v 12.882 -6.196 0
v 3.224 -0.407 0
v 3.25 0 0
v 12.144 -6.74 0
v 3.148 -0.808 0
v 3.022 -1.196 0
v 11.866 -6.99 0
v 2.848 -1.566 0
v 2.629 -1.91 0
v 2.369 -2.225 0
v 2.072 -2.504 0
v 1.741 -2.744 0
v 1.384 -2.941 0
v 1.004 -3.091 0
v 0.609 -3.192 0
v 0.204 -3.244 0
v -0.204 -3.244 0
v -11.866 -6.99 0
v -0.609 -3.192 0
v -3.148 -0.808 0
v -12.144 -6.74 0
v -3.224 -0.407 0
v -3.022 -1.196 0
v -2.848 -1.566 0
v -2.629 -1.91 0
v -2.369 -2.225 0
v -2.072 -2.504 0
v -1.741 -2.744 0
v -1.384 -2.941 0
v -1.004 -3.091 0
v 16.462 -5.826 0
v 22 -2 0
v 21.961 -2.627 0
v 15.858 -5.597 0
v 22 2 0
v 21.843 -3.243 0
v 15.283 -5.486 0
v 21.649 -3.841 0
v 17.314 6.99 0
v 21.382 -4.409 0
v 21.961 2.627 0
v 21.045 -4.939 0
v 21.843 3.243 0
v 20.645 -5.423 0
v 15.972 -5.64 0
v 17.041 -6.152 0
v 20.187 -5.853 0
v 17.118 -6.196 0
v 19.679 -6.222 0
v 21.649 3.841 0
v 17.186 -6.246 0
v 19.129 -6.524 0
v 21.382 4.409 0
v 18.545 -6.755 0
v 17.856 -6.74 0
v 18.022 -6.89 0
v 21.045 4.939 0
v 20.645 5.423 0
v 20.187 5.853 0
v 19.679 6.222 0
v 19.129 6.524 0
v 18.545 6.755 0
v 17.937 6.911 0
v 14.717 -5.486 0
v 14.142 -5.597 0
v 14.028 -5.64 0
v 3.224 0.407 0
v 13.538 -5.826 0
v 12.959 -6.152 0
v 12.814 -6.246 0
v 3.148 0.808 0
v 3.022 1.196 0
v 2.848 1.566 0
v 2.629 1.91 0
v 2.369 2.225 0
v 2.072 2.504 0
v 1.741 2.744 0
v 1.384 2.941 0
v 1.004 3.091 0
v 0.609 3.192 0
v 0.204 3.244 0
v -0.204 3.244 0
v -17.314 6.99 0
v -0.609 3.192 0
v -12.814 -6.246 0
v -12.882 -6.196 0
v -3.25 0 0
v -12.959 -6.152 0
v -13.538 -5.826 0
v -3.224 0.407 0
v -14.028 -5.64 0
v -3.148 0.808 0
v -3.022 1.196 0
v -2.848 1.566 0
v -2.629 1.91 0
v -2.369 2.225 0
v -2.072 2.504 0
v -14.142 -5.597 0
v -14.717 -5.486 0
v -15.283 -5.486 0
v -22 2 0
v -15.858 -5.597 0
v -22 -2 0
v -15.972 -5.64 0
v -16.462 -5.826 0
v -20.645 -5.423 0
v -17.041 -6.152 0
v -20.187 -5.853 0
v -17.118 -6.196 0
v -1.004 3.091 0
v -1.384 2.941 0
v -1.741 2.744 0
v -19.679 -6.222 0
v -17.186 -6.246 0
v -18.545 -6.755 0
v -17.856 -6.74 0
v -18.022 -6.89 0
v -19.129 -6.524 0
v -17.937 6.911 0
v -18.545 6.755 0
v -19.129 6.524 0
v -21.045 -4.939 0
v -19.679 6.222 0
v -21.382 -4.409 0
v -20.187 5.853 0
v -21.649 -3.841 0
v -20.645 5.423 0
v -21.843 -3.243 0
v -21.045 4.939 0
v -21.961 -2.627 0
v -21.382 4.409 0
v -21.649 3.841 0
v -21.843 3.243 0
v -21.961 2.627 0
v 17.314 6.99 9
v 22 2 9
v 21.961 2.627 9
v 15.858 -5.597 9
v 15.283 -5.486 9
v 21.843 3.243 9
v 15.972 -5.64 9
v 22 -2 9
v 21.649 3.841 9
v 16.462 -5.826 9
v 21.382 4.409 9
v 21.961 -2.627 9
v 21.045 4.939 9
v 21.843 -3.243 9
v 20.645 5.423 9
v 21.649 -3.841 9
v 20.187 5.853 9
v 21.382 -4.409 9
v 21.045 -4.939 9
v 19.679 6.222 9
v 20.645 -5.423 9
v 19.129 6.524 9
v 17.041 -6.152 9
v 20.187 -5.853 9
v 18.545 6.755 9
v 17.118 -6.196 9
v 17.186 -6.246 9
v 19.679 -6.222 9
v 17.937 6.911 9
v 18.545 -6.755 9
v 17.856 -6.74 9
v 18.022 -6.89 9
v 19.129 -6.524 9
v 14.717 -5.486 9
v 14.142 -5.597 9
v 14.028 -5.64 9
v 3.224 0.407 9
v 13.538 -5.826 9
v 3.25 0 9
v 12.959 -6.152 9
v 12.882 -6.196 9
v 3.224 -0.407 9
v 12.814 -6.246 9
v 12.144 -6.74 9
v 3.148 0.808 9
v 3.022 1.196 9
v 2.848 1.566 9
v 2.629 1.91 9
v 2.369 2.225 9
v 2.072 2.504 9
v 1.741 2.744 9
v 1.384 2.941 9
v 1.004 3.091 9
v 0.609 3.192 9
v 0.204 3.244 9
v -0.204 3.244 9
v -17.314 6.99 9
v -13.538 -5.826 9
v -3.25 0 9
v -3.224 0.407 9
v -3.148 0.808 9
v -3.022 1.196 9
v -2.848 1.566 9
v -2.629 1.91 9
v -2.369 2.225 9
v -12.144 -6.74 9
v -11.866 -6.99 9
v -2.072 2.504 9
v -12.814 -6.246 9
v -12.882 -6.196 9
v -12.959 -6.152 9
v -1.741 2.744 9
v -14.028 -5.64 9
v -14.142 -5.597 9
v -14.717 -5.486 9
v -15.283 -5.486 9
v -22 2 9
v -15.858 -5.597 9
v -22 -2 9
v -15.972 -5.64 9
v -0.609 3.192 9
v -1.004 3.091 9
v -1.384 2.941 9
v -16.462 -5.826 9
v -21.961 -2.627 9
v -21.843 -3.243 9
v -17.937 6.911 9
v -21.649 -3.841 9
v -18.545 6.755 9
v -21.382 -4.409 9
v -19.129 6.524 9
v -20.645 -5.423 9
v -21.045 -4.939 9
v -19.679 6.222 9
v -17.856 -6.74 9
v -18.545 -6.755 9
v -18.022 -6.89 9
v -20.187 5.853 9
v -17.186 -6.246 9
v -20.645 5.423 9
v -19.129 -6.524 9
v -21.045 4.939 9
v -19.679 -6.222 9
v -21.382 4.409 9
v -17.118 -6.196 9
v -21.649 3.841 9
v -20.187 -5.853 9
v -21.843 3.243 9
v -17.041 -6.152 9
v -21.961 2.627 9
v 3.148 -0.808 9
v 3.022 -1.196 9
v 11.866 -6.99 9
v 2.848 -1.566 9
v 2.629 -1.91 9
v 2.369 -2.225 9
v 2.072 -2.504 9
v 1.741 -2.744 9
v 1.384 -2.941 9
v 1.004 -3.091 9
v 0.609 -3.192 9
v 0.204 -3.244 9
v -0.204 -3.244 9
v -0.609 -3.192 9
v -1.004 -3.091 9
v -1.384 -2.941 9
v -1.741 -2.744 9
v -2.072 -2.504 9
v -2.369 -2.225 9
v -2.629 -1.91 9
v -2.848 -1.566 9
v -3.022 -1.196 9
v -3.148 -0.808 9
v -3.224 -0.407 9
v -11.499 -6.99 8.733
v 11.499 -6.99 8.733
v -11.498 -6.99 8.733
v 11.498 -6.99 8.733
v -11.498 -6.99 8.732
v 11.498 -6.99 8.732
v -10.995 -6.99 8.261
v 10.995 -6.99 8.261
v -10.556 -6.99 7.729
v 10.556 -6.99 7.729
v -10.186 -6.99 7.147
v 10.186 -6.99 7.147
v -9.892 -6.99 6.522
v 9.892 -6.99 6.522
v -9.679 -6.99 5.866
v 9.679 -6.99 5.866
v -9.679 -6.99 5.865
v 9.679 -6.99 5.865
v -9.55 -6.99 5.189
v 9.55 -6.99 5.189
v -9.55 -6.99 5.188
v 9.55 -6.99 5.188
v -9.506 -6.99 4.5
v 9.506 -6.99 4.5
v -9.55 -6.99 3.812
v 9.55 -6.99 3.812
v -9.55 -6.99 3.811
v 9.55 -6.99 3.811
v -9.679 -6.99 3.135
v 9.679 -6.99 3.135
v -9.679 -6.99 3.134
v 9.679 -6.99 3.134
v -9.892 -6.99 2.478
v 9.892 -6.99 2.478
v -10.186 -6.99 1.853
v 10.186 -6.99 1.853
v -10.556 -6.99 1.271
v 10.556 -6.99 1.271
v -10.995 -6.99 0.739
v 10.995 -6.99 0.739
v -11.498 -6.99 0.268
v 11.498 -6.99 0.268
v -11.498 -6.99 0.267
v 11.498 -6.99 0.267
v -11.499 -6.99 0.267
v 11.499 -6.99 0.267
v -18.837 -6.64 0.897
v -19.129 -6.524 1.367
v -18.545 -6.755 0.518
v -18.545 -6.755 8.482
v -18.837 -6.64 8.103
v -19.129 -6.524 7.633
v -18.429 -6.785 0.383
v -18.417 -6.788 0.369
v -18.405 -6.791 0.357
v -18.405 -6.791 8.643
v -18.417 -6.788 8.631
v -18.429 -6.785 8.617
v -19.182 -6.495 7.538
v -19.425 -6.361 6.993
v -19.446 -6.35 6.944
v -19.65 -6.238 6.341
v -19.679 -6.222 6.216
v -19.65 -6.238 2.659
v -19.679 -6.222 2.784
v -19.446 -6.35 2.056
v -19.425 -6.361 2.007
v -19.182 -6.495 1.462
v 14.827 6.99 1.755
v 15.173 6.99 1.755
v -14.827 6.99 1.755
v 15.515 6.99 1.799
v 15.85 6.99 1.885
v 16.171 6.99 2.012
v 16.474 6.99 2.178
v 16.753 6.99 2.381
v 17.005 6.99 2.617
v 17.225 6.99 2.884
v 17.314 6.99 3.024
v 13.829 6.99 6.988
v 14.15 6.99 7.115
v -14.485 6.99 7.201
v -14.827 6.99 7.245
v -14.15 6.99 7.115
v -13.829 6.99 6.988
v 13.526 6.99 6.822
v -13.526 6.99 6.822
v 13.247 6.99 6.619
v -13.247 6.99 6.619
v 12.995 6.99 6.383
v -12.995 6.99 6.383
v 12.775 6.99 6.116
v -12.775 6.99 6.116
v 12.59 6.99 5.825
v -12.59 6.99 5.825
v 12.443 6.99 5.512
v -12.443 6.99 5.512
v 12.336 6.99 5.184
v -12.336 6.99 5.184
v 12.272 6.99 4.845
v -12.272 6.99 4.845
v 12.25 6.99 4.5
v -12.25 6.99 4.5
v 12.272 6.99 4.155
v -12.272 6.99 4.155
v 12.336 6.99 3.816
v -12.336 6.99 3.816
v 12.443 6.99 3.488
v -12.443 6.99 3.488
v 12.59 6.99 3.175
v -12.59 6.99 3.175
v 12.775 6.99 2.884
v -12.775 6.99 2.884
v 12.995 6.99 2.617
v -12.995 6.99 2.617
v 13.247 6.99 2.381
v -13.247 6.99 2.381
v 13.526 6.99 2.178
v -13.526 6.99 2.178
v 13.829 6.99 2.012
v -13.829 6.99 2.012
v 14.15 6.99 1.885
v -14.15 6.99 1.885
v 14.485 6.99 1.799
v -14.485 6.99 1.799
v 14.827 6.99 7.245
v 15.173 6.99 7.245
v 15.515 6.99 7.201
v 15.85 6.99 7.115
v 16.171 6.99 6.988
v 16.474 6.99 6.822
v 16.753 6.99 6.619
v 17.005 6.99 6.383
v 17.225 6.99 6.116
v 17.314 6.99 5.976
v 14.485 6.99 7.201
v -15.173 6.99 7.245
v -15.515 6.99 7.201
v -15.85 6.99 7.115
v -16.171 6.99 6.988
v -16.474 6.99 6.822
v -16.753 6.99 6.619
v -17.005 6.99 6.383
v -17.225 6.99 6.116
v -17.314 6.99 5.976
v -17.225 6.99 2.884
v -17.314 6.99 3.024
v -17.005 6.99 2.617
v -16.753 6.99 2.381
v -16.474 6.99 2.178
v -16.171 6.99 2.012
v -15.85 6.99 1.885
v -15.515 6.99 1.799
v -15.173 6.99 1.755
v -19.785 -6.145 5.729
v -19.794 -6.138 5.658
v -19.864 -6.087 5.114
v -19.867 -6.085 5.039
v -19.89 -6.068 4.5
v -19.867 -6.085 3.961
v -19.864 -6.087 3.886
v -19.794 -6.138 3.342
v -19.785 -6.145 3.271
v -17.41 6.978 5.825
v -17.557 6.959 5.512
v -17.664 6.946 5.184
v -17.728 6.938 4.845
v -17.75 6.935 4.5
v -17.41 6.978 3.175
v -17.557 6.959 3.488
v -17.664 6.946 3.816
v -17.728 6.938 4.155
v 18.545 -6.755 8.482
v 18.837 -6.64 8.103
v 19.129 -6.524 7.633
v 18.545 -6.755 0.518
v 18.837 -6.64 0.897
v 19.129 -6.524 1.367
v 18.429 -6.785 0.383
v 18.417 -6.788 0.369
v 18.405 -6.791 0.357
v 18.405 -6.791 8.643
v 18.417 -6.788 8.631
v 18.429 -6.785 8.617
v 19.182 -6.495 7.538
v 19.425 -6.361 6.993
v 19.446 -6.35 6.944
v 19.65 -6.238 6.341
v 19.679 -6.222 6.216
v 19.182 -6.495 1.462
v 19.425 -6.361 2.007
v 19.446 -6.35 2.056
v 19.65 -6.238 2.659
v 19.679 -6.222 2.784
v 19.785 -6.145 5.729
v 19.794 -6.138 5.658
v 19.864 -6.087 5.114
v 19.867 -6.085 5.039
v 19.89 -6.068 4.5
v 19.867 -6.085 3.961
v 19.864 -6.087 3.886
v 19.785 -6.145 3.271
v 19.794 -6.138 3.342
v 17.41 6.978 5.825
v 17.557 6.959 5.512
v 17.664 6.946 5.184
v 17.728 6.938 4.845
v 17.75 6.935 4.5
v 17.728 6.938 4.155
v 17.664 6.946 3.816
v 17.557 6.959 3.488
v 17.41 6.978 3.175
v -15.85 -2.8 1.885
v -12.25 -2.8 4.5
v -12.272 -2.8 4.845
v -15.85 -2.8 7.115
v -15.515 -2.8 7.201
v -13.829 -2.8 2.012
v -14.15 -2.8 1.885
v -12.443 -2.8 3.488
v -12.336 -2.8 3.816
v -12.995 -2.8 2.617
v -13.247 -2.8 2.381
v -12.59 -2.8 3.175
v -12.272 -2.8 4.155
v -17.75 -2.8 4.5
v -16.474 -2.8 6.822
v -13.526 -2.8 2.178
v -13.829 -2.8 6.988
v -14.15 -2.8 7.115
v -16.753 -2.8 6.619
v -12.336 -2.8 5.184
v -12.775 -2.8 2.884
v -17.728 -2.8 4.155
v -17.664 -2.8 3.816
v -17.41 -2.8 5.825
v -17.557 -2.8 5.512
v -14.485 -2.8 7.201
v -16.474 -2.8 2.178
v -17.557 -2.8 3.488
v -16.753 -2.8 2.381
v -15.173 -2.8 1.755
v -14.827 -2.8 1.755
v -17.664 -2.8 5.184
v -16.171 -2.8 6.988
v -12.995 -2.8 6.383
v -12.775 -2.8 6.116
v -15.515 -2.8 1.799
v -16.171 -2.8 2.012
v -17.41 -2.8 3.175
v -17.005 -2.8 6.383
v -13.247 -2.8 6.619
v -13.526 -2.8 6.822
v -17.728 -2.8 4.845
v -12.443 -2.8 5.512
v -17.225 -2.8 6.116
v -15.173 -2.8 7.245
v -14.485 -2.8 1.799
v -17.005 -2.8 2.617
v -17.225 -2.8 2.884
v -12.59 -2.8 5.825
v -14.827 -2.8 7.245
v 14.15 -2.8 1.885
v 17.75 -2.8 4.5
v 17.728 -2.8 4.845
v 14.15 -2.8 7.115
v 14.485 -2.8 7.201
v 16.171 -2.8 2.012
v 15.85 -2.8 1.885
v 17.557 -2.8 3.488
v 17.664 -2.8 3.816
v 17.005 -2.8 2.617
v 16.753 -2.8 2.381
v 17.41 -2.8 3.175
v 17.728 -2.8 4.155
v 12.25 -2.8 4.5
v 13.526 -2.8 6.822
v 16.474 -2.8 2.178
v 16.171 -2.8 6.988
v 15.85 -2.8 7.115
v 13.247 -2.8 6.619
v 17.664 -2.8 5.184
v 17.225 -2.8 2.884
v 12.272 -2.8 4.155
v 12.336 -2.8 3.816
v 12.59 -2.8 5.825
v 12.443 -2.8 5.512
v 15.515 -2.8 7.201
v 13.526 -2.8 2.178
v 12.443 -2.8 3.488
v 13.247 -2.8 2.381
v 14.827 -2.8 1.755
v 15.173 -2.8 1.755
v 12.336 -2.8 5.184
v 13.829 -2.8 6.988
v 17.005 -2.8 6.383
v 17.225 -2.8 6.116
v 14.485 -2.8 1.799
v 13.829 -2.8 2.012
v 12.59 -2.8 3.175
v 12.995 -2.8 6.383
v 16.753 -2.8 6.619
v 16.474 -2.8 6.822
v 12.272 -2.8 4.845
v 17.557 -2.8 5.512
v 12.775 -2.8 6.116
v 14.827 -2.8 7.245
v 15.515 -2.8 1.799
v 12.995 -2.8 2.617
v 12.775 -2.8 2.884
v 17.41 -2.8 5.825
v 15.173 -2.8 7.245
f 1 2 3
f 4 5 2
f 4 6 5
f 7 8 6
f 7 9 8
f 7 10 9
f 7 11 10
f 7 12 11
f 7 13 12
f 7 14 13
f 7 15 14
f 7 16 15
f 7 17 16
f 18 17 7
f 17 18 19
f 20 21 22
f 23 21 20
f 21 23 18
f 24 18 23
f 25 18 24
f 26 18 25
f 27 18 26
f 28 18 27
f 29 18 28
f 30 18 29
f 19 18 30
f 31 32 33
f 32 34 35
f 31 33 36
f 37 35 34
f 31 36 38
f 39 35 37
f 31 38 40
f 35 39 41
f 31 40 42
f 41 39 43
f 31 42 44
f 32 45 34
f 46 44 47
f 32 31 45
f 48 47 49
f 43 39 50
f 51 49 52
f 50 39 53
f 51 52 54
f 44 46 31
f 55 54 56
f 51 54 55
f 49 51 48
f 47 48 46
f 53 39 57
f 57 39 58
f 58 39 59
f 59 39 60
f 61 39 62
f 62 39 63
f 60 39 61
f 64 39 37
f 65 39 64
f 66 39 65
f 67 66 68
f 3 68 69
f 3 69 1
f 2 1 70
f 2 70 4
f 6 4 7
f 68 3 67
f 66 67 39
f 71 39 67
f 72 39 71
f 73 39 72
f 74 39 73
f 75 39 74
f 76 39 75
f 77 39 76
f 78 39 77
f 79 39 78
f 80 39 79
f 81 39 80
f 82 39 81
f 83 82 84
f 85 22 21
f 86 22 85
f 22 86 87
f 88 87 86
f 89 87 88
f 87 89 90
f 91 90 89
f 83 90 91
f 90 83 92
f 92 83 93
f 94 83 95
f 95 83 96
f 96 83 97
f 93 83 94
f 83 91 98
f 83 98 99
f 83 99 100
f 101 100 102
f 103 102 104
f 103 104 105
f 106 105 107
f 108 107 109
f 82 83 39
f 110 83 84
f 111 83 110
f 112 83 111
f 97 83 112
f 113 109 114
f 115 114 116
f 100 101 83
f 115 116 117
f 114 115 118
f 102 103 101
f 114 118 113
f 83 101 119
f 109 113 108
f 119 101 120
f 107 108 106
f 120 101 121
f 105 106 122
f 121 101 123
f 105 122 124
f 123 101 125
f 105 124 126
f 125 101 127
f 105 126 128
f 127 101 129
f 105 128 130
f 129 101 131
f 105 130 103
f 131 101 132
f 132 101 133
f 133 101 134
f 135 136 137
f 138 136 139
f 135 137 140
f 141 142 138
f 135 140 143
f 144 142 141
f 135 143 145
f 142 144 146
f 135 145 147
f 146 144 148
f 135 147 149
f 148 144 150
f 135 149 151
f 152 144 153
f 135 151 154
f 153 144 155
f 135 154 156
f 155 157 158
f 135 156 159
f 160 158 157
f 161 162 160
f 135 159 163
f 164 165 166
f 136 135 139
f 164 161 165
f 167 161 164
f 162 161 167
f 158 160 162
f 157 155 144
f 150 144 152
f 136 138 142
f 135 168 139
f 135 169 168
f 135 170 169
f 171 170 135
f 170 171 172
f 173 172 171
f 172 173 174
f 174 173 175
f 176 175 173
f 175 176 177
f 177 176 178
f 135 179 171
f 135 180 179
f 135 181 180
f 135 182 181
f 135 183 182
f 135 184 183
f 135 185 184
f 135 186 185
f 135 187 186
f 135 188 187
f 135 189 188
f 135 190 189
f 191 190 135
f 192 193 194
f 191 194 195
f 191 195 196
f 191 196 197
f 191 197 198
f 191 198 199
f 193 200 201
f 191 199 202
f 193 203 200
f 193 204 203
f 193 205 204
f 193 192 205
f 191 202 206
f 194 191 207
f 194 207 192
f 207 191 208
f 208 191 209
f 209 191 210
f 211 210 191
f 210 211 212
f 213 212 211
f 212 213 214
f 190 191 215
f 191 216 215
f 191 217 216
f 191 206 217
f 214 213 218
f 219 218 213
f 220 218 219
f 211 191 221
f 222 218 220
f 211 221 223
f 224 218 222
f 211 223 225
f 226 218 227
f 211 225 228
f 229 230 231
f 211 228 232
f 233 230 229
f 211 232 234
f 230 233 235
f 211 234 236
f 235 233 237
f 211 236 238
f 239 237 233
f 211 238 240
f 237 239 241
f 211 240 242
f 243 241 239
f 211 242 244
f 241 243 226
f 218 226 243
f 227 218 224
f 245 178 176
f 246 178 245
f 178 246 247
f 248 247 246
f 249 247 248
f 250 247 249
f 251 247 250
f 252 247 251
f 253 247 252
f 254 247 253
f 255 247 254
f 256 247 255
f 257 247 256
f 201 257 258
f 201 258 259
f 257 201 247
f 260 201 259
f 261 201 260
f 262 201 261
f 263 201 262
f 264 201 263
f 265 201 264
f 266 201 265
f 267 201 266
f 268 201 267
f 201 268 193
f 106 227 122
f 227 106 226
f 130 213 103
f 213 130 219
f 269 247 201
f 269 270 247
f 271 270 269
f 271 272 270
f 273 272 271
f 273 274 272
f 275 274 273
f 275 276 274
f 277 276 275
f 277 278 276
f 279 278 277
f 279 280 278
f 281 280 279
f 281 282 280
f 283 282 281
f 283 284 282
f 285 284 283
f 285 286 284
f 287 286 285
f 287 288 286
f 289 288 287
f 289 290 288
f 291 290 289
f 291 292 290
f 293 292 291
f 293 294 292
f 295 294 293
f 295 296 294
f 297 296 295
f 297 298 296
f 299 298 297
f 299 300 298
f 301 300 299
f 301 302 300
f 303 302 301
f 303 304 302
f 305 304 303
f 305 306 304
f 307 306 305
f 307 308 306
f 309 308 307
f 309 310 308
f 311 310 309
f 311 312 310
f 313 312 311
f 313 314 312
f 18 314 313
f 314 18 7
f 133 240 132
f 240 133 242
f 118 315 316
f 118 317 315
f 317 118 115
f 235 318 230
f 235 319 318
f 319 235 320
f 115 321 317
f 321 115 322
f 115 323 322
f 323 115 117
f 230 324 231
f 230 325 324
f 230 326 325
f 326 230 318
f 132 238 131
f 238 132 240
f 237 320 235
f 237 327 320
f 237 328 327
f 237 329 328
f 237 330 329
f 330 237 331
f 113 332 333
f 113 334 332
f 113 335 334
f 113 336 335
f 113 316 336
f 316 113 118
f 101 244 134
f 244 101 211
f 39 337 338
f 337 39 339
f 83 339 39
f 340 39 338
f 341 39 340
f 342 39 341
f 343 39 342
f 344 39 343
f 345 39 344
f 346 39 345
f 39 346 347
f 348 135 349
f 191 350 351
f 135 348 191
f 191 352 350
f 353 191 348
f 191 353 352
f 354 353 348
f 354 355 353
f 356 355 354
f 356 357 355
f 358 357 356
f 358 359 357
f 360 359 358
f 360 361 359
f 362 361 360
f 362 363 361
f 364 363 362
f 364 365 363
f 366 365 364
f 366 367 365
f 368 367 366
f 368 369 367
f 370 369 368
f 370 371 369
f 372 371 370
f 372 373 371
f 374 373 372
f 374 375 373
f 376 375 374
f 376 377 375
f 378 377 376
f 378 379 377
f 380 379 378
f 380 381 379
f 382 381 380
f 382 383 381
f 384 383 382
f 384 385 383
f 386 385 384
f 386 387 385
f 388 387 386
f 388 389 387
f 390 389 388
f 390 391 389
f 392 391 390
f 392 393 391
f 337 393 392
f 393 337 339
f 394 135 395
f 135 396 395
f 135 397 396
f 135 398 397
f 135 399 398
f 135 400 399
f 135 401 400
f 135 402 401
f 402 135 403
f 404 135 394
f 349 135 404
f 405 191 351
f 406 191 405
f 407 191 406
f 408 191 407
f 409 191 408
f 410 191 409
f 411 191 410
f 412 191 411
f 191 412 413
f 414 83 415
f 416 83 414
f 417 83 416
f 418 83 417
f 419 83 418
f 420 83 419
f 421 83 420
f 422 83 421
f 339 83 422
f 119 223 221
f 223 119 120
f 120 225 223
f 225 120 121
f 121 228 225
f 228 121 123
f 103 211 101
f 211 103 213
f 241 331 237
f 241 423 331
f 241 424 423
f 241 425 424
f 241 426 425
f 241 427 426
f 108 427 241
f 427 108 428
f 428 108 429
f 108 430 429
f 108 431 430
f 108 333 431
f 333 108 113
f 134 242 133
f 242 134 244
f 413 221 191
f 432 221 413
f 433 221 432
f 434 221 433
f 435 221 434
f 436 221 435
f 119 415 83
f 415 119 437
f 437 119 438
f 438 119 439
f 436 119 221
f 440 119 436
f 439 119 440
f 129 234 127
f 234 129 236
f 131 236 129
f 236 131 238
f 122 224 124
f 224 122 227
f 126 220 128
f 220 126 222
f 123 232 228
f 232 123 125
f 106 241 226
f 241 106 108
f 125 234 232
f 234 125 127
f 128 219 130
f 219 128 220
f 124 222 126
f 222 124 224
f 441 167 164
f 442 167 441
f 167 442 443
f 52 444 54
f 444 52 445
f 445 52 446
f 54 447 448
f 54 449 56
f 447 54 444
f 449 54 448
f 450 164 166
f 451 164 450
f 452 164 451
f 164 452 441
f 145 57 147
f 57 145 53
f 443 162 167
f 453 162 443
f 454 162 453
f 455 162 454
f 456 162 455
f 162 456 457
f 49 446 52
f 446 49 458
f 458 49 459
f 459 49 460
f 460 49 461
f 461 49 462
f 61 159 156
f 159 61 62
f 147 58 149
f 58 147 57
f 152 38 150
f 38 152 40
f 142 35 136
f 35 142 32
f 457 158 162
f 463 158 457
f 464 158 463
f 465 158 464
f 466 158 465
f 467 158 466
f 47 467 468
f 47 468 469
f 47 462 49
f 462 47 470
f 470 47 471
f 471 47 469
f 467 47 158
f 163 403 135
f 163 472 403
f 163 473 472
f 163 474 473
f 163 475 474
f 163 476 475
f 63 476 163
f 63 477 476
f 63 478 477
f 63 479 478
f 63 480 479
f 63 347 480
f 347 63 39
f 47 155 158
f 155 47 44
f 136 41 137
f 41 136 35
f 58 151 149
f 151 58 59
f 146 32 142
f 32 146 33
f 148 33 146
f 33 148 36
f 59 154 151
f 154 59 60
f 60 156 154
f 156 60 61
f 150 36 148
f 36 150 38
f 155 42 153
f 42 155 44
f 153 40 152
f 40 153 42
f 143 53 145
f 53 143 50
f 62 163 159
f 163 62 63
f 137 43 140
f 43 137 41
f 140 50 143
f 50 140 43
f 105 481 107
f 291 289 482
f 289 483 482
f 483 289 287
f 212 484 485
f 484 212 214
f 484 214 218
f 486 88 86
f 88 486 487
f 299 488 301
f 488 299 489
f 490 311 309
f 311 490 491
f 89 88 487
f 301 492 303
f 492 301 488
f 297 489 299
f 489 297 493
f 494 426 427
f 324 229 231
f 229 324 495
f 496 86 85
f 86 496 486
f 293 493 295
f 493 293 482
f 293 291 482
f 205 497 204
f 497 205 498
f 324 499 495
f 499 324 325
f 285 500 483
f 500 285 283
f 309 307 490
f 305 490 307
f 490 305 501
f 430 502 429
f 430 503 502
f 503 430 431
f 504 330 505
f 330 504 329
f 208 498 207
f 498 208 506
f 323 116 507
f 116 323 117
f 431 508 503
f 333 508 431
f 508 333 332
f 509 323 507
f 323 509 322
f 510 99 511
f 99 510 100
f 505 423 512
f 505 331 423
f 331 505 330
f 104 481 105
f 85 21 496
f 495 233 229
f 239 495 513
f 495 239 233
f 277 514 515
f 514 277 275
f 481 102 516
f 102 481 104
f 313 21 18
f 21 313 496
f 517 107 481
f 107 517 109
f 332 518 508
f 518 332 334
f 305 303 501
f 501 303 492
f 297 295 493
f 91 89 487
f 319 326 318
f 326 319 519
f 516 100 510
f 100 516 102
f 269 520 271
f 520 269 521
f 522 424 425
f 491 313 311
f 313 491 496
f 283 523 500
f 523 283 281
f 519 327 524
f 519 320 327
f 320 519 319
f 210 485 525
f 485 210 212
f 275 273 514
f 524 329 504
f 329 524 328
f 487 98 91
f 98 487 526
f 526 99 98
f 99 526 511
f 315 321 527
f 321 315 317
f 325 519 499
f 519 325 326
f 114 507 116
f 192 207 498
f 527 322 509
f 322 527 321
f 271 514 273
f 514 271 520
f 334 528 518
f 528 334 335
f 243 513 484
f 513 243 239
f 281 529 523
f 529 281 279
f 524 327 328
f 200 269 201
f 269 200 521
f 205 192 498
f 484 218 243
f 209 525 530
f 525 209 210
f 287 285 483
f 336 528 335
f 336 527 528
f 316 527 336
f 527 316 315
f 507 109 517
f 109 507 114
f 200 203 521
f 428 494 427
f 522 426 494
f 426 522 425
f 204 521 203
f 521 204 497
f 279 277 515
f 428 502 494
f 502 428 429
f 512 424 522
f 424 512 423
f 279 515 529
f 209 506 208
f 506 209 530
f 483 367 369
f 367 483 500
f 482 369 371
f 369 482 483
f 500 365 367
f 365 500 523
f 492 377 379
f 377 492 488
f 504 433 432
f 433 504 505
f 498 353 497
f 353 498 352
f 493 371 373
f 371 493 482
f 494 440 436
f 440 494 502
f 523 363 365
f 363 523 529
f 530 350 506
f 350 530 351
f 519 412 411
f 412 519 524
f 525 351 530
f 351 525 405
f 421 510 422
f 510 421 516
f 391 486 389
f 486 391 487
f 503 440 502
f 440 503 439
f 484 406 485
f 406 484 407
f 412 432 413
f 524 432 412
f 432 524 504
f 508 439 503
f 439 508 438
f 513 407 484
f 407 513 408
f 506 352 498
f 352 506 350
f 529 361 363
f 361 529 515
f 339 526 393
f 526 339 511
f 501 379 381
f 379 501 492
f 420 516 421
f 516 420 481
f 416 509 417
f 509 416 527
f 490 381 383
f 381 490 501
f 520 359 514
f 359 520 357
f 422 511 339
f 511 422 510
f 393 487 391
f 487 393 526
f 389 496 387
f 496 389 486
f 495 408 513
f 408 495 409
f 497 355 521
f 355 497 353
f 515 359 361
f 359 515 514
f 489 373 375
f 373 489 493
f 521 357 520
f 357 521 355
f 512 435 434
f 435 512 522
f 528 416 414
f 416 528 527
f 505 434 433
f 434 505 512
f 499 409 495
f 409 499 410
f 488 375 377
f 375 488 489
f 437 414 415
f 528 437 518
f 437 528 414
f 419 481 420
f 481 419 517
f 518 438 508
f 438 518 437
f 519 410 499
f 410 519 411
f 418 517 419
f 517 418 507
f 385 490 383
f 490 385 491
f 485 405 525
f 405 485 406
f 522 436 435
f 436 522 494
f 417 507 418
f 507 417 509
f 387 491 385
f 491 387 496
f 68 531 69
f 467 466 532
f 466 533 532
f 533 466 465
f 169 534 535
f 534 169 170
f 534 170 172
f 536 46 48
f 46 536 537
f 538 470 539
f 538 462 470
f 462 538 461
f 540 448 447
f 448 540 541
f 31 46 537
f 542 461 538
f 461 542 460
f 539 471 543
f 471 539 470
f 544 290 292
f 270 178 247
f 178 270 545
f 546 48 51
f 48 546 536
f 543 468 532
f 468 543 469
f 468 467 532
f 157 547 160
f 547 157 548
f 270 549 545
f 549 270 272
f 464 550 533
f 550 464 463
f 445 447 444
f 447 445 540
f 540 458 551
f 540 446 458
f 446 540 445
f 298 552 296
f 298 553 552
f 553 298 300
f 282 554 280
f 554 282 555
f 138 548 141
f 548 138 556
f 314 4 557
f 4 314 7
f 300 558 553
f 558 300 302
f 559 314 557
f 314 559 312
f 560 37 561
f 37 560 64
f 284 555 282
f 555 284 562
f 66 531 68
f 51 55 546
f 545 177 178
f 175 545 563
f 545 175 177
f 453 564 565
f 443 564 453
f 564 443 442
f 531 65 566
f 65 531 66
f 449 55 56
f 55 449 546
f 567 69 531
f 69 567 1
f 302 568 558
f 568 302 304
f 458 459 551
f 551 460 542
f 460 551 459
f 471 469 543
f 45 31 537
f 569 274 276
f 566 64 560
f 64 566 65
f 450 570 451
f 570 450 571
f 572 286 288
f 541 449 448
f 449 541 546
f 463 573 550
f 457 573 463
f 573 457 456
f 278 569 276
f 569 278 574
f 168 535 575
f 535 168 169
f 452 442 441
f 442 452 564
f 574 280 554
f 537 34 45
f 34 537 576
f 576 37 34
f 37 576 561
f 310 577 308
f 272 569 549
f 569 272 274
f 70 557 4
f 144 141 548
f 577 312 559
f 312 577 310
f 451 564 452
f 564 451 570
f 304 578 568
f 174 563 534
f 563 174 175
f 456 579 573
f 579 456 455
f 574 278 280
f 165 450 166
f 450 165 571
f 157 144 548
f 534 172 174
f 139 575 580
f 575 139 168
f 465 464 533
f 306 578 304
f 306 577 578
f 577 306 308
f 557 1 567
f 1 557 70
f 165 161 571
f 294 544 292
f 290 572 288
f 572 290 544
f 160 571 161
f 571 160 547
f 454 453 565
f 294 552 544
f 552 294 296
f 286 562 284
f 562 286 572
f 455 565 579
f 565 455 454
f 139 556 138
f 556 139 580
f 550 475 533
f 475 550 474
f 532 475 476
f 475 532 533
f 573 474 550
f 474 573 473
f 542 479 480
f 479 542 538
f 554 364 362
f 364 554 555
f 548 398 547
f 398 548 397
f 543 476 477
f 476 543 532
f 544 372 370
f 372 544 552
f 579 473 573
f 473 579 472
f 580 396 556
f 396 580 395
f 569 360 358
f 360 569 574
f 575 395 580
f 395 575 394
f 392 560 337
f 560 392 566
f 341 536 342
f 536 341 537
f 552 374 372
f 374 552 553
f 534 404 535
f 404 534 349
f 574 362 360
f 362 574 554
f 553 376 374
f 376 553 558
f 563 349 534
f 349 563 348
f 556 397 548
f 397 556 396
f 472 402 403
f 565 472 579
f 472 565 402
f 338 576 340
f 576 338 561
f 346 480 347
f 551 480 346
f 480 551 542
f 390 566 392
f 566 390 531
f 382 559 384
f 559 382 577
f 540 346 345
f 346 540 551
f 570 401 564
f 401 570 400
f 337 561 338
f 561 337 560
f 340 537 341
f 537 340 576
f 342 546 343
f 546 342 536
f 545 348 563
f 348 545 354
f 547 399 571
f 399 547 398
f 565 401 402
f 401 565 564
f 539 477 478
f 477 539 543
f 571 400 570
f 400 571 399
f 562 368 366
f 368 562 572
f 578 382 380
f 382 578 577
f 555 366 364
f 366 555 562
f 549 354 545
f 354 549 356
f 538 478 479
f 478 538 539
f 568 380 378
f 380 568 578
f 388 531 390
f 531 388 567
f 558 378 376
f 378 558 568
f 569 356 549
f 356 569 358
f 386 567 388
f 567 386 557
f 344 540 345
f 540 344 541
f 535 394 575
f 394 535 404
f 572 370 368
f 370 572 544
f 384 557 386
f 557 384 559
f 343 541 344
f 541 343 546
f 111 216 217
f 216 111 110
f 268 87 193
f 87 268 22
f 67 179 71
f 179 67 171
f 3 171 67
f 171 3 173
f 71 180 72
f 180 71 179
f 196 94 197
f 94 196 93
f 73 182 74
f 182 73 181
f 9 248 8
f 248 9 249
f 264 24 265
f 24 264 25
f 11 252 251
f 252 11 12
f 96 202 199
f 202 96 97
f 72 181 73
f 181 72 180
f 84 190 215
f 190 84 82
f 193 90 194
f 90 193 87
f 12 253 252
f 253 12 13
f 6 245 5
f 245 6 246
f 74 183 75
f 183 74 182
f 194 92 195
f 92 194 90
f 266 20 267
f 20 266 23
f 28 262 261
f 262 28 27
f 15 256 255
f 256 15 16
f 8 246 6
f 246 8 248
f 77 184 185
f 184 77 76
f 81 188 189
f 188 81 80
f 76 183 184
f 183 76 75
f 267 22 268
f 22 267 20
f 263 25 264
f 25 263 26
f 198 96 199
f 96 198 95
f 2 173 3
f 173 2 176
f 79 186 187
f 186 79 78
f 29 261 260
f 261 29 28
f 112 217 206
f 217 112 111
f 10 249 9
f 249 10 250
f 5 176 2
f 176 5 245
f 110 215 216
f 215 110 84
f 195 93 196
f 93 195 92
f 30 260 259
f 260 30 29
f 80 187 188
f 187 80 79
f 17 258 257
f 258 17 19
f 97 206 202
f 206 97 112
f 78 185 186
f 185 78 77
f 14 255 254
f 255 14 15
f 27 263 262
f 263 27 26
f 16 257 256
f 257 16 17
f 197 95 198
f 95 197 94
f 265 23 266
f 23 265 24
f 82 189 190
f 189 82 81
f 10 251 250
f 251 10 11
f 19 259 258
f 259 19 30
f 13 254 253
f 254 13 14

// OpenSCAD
$fn = 50;


difference() {
	union() {
		cylinder(h = 9, r = 7.0000000000);
		translate(v = [-7.5000000000, 0.0000000000, 0]) {
			hull() {
				translate(v = [-9.5000000000, 2.0000000000, 0]) {
					cylinder(h = 9, r = 5);
				}
				translate(v = [9.5000000000, 2.0000000000, 0]) {
					cylinder(h = 9, r = 5);
				}
				translate(v = [-9.5000000000, -2.0000000000, 0]) {
					cylinder(h = 9, r = 5);
				}
				translate(v = [9.5000000000, -2.0000000000, 0]) {
					cylinder(h = 9, r = 5);
				}
			}
		}
		translate(v = [-7.5000000000, 0.0000000000, 0]) {
			hull() {
				translate(v = [-9.5000000000, 2.0000000000, 0]) {
					cylinder(h = 9, r = 5);
				}
				translate(v = [9.5000000000, 2.0000000000, 0]) {
					cylinder(h = 9, r = 5);
				}
				translate(v = [-9.5000000000, -2.0000000000, 0]) {
					cylinder(h = 9, r = 5);
				}
				translate(v = [9.5000000000, -2.0000000000, 0]) {
					cylinder(h = 9, r = 5);
				}
			}
		}
		translate(v = [7.5000000000, 0.0000000000, 0]) {
			hull() {
				translate(v = [-9.5000000000, 2.0000000000, 0]) {
					cylinder(h = 9, r = 5);
				}
				translate(v = [9.5000000000, 2.0000000000, 0]) {
					cylinder(h = 9, r = 5);
				}
				translate(v = [-9.5000000000, -2.0000000000, 0]) {
					cylinder(h = 9, r = 5);
				}
				translate(v = [9.5000000000, -2.0000000000, 0]) {
					cylinder(h = 9, r = 5);
				}
			}
		}
		translate(v = [7.5000000000, 0.0000000000, 0]) {
			hull() {
				translate(v = [-9.5000000000, 2.0000000000, 0]) {
					cylinder(h = 9, r = 5);
				}
				translate(v = [9.5000000000, 2.0000000000, 0]) {
					cylinder(h = 9, r = 5);
				}
				translate(v = [-9.5000000000, -2.0000000000, 0]) {
					cylinder(h = 9, r = 5);
				}
				translate(v = [9.5000000000, -2.0000000000, 0]) {
					cylinder(h = 9, r = 5);
				}
			}
		}
	}
	union() {
		translate(v = [-15.0000000000, -7.0000000000, 4.5000000000]) {
			rotate(a = [90, 0, 0]) {
				difference() {
					union() {
						#translate(v = [0, 0, -14.0000000000]) {
							cylinder(h = 14, r = 2.2500000000);
						}
						#translate(v = [0, 0, -4.2000000000]) {
							cylinder(h = 4.2000000000, r1 = 2.7500000000, r2 = 5.5000000000);
						}
						#translate(v = [0, 0, -14.0000000000]) {
							cylinder(h = 14, r = 2.7500000000);
						}
						#translate(v = [0, 0, -14.0000000000]) {
							cylinder(h = 14, r = 2.2500000000);
						}
					}
					union();
				}
			}
		}
		translate(v = [15.0000000000, -7.0000000000, 4.5000000000]) {
			rotate(a = [90, 0, 0]) {
				difference() {
					union() {
						#translate(v = [0, 0, -14.0000000000]) {
							cylinder(h = 14, r = 2.2500000000);
						}
						#translate(v = [0, 0, -4.2000000000]) {
							cylinder(h = 4.2000000000, r1 = 2.7500000000, r2 = 5.5000000000);
						}
						#translate(v = [0, 0, -14.0000000000]) {
							cylinder(h = 14, r = 2.7500000000);
						}
						#translate(v = [0, 0, -14.0000000000]) {
							cylinder(h = 14, r = 2.2500000000);
						}
					}
					union();
				}
			}
		}
		translate(v = [0, 0, -100]) {
			cylinder(h = 200, r = 3.2500000000);
		}
		translate(v = [0, 0, -100]) {
			cylinder(h = 200, r = 1.8000000000);
		}
	}
}
